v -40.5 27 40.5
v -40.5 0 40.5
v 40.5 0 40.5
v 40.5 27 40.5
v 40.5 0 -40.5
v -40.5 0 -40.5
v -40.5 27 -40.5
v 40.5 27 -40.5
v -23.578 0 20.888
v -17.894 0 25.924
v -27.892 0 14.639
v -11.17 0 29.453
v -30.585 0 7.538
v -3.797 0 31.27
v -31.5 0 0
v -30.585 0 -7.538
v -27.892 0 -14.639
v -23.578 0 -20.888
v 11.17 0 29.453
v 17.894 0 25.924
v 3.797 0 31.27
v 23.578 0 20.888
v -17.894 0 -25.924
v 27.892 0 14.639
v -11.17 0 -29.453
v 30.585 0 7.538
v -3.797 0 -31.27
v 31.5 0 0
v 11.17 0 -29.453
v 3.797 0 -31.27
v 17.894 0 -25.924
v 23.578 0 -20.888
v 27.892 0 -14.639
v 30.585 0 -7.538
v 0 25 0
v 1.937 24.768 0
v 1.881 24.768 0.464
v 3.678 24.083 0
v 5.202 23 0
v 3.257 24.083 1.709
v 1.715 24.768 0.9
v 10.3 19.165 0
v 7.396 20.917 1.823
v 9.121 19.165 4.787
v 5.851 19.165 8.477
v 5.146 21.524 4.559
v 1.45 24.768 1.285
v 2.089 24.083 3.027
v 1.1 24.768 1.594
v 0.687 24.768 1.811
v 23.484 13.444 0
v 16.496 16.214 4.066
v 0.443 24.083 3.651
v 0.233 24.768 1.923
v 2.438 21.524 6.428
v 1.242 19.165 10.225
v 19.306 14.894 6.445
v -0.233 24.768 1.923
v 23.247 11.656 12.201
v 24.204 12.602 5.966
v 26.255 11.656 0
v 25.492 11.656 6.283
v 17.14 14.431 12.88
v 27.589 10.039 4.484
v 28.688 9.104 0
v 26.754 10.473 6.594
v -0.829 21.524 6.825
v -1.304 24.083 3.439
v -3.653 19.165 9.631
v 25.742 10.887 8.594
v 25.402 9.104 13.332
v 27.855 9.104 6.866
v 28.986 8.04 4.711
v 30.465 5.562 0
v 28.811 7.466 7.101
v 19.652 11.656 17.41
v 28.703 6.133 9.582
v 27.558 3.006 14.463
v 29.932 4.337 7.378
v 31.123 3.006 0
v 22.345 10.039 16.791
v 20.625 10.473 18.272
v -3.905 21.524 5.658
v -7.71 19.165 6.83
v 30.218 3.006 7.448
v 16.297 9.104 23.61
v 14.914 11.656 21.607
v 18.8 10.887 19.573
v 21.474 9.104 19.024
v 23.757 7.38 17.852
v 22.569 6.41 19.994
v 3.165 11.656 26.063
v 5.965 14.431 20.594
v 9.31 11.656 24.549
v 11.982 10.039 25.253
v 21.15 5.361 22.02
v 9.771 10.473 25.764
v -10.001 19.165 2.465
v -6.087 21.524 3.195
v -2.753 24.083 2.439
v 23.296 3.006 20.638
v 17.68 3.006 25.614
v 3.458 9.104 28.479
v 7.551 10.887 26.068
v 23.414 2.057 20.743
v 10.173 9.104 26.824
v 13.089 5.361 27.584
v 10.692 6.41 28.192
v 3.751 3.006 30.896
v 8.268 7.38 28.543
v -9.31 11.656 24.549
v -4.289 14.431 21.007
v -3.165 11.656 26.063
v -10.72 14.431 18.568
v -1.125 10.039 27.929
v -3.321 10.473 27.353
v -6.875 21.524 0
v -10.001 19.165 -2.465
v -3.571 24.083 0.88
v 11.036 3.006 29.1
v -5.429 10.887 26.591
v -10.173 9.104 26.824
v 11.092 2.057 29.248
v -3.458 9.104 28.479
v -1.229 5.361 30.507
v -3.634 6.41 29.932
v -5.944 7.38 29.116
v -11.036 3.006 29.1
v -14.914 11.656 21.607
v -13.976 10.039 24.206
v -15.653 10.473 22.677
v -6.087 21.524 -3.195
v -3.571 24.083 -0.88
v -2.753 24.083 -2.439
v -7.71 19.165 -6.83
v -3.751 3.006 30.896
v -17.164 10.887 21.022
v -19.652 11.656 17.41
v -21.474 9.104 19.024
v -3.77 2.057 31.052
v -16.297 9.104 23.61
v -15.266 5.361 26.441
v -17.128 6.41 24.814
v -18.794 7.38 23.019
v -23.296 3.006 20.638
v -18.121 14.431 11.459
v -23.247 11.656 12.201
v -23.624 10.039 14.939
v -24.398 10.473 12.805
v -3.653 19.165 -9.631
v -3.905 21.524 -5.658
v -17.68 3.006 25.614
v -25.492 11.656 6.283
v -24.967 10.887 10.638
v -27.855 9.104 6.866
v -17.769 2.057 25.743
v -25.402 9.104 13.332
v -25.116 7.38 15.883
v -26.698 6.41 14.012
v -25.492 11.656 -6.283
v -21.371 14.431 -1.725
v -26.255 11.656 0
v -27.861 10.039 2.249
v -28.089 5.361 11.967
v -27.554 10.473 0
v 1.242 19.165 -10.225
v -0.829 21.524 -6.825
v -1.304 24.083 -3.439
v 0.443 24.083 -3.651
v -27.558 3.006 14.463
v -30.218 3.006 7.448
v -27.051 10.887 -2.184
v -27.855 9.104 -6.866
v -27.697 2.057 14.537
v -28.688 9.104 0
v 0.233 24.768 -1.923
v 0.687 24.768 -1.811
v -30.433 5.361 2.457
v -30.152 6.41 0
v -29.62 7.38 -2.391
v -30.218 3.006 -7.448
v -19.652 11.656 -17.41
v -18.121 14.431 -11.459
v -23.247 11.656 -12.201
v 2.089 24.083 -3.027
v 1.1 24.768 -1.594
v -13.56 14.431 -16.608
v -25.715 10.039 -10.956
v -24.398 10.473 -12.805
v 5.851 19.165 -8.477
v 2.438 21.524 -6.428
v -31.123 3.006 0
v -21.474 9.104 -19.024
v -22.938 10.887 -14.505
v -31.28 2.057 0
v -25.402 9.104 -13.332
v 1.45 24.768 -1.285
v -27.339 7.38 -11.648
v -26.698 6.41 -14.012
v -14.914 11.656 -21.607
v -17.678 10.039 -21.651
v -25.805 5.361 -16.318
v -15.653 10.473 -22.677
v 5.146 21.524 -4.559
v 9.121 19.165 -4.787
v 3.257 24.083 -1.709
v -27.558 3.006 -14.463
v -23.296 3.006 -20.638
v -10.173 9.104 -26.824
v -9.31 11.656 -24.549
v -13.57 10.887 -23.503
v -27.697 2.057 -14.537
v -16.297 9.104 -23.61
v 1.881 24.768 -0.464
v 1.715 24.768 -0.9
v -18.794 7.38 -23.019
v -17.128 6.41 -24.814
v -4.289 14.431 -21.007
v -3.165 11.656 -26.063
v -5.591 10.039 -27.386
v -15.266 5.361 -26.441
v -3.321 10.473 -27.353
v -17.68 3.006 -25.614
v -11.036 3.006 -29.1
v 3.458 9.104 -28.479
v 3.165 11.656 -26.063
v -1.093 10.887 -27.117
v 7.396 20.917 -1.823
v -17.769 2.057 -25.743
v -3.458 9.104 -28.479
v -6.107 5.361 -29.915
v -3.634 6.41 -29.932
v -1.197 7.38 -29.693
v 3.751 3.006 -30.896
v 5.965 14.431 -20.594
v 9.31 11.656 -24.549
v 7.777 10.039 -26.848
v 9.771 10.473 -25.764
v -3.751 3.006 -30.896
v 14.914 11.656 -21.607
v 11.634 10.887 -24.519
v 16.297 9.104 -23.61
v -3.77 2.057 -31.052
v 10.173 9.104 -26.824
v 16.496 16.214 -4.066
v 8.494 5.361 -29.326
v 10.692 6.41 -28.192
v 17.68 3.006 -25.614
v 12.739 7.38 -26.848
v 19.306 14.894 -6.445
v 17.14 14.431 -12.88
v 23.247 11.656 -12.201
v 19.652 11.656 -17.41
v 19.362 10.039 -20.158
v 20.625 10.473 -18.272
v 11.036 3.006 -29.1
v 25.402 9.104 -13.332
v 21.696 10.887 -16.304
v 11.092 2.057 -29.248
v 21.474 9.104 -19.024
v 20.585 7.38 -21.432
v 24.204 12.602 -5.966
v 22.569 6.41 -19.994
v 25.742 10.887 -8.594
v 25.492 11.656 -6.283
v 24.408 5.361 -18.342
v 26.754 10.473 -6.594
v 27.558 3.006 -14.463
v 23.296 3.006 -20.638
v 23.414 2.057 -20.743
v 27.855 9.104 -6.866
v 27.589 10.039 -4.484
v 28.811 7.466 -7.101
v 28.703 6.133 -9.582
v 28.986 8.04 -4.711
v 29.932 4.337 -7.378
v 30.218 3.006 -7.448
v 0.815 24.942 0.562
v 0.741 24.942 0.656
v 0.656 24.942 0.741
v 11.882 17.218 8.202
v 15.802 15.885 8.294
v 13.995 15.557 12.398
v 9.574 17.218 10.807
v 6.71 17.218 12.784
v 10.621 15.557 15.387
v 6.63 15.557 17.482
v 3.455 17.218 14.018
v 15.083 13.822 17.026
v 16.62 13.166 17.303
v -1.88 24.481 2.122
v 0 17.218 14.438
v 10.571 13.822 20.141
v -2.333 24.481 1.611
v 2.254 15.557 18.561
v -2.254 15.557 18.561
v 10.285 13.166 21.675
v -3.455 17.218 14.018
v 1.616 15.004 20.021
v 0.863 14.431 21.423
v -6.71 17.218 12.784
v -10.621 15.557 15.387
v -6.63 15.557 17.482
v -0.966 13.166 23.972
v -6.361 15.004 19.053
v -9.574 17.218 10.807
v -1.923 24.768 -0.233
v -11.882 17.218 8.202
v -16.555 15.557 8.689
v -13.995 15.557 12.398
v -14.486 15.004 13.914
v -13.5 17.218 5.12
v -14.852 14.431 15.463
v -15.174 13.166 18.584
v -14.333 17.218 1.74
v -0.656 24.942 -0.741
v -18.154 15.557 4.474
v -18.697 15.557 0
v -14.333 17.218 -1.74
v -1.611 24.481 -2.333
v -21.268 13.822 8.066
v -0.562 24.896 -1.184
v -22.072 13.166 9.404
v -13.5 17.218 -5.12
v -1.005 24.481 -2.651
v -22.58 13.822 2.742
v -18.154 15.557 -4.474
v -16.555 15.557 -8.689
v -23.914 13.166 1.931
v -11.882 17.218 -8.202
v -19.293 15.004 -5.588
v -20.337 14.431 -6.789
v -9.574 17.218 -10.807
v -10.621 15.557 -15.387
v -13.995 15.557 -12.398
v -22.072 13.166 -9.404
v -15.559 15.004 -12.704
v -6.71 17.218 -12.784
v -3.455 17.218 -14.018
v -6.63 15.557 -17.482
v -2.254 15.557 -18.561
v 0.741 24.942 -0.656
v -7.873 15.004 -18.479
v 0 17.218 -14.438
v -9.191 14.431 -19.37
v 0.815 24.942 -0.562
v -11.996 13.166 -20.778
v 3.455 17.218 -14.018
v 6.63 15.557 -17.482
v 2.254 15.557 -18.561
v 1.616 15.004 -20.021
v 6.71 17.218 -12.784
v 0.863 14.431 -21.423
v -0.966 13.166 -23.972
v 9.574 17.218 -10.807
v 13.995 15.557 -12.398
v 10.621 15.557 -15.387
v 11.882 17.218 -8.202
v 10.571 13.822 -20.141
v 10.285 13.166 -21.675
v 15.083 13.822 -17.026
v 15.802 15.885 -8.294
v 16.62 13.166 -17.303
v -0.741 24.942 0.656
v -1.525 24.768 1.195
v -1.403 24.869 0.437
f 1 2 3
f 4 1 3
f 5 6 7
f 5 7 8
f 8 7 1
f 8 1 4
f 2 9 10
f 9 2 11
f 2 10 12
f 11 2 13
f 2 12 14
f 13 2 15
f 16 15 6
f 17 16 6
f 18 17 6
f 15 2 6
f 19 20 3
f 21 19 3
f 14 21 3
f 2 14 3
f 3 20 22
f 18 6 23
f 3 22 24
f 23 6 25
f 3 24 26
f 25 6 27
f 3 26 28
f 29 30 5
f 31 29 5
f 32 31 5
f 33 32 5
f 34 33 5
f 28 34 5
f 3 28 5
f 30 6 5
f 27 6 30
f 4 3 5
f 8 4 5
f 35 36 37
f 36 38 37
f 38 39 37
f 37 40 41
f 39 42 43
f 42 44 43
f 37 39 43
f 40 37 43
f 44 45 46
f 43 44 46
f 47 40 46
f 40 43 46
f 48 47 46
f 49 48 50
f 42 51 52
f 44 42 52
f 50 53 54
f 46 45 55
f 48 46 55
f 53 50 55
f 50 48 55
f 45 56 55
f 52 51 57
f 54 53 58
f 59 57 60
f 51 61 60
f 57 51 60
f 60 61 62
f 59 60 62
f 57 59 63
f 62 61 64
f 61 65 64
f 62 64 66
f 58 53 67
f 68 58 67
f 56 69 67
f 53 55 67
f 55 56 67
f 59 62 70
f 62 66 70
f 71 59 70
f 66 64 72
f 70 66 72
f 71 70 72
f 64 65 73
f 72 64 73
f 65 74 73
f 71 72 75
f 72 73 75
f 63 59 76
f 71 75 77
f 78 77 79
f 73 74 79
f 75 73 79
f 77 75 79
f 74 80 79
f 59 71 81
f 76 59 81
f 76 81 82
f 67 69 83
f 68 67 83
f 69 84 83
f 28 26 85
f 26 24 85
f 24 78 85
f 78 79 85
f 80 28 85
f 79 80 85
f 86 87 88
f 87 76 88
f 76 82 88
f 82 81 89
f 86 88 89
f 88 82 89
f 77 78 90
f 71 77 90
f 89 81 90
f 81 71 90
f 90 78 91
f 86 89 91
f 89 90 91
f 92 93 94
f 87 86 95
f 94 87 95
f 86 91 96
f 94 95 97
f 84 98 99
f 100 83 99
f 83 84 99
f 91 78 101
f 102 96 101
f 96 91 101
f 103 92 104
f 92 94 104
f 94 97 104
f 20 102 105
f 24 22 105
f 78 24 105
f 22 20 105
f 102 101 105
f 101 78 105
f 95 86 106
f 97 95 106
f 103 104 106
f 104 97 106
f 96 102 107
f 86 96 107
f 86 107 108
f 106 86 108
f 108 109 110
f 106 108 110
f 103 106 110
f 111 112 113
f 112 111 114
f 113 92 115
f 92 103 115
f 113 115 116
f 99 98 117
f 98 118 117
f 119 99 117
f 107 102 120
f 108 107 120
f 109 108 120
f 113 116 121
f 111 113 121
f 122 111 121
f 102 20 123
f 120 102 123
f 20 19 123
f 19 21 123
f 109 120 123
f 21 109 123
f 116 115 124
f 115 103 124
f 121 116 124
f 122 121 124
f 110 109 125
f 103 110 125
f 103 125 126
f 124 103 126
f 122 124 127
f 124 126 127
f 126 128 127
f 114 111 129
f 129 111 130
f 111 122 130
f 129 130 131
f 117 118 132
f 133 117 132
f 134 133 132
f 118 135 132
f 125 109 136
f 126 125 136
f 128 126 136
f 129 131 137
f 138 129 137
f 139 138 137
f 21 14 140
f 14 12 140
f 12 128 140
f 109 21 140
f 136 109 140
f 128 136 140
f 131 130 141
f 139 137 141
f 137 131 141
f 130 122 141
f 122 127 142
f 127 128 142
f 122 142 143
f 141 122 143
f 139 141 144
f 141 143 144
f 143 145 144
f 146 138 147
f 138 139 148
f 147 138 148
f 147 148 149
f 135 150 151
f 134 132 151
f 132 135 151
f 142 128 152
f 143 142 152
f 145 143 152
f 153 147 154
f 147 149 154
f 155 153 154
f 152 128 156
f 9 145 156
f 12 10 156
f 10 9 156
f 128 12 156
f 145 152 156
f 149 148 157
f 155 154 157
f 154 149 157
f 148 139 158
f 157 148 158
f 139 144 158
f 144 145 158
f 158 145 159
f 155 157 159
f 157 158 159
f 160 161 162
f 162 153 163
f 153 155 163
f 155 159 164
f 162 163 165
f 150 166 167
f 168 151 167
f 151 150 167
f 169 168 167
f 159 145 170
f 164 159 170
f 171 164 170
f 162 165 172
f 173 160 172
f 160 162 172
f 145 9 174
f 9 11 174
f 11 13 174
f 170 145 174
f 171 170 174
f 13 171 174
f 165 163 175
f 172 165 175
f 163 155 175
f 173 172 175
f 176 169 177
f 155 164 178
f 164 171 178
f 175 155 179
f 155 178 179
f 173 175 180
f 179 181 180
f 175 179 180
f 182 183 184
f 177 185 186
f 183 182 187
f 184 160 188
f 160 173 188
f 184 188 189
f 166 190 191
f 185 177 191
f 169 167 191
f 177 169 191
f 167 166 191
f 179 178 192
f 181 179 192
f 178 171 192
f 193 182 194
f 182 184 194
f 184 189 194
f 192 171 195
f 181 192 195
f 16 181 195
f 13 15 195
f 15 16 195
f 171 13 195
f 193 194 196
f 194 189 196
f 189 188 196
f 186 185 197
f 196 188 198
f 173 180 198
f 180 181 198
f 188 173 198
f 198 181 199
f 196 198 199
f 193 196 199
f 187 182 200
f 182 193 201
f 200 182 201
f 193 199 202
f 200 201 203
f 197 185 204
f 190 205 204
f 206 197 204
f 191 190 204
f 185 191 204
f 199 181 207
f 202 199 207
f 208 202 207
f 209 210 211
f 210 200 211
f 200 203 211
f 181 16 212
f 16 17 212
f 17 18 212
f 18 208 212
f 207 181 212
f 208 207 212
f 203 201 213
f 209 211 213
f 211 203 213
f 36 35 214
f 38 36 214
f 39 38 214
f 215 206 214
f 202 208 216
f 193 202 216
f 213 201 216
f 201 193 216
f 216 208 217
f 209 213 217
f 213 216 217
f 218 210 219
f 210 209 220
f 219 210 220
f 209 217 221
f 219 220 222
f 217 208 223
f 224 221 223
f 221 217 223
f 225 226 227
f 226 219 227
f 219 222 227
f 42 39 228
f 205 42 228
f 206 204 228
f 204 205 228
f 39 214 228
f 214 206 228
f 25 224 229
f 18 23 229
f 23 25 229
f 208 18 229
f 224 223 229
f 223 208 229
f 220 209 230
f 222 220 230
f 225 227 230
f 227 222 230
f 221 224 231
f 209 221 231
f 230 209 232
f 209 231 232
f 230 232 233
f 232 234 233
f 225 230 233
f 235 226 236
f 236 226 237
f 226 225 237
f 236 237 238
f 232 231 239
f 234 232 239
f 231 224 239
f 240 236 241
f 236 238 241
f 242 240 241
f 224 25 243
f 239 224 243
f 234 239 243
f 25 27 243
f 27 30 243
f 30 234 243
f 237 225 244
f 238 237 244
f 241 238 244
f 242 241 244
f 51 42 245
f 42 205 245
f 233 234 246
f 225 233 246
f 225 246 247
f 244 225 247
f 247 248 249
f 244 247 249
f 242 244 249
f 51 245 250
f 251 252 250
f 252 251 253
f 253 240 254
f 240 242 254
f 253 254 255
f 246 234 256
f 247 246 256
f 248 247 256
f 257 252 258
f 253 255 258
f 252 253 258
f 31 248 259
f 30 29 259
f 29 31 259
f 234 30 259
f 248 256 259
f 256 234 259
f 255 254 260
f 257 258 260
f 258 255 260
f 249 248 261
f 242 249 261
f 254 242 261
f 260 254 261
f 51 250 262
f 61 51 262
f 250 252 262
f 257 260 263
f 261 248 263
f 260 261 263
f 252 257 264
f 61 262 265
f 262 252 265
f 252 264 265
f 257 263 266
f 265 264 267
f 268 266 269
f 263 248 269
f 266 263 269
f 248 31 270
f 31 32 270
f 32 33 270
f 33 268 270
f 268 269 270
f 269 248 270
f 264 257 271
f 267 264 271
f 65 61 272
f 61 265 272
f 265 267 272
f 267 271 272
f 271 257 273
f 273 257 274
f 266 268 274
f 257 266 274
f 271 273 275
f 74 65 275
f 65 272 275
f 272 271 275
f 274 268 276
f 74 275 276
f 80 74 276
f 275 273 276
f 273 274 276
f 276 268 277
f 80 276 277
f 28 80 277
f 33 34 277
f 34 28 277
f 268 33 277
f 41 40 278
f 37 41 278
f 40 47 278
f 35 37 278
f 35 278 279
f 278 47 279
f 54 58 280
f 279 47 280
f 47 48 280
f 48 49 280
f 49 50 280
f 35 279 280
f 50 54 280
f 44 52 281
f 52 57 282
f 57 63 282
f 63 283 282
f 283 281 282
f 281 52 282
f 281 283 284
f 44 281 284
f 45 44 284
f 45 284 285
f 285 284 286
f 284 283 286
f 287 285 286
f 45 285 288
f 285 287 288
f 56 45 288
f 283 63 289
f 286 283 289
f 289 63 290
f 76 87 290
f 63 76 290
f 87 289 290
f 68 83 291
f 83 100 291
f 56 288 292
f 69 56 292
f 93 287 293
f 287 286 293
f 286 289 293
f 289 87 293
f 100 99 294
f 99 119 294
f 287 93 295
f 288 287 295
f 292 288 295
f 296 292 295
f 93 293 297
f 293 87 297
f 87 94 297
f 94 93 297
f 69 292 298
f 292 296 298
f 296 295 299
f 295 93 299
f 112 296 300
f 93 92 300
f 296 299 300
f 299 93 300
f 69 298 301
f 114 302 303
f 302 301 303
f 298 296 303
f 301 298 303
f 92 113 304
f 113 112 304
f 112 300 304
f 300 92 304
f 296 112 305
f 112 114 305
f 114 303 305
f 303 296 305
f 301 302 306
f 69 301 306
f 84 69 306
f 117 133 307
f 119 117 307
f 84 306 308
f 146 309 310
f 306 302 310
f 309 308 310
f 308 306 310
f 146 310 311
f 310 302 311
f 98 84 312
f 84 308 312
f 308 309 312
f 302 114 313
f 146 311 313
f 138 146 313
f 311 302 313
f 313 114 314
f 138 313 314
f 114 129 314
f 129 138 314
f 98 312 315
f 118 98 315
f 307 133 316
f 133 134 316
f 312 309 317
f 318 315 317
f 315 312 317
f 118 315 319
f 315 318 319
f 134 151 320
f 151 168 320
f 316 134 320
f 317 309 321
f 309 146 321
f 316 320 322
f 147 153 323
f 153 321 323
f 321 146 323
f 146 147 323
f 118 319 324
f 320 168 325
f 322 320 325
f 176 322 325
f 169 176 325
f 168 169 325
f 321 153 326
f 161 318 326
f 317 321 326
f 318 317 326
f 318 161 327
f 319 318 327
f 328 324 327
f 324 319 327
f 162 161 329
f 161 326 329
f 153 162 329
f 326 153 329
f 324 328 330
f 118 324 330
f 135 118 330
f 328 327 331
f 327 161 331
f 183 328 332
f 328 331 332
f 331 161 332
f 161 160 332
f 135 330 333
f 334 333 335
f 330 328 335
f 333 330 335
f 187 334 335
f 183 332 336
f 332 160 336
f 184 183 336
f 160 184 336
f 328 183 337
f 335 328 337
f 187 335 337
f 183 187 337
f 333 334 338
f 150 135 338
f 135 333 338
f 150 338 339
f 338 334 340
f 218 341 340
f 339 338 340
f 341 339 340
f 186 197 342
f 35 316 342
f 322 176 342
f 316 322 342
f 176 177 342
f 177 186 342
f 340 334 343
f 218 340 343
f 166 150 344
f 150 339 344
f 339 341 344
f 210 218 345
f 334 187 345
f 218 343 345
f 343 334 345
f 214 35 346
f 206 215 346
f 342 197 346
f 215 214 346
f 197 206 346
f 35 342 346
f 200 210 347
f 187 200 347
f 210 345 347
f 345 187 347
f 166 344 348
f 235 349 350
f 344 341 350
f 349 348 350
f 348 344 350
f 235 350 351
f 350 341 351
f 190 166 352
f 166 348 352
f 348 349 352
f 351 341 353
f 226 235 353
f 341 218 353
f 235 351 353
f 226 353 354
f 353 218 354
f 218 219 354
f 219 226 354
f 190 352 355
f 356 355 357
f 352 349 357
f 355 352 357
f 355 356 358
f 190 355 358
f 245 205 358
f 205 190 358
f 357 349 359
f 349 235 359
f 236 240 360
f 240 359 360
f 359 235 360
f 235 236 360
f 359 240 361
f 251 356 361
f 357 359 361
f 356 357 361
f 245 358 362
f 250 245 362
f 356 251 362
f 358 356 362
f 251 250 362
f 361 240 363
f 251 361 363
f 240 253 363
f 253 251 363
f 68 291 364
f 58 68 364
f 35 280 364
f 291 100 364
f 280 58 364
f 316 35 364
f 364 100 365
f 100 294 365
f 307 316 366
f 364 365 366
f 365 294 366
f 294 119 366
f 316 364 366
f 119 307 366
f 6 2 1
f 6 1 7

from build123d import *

# Parameters (mm, degrees)
SKETCH11_W          = 81
SKETCH11_H          = 81
BOSS_EXTRUDE1_DEPTH = 27


with BuildPart() as part:
    # Sketch11 → Boss-Extrude1 (new body)
    with BuildSketch(Plane(origin=(0, 0, 0), x_dir=(1, 0, 0), z_dir=(0, 1, 0))):
        Rectangle(SKETCH11_W, SKETCH11_H)
    extrude(amount=BOSS_EXTRUDE1_DEPTH)

    # Sketch1 → Cut-Revolve1 (revolve, cut)
    with BuildSketch(Plane.XY):
        with BuildLine():
            Line((0, 25), (0, 10))
            Line((0, 10), (0, -10))
            Line((0, -10), (31.5, -10))
            Line((31.5, -10), (31.5, 0))
            add(Edge.make_bspline(
                [(0, 25), (1.37149288, 25), (4.090224786, 24.302680674), (10.751491586, 17.136812446), (25.578767024, 15.070162158), (31.038481607, 6.450242929), (31.5, 0)],
                knots=[0, 0, 0, 0, 0.091245862, 0.195023315, 0.675457006, 1, 1, 1, 1], degree=3))
        make_face()
    revolve(axis=Axis((0, 10, 0), (0, -1, 0)), mode=Mode.SUBTRACT)


solid = part.part
